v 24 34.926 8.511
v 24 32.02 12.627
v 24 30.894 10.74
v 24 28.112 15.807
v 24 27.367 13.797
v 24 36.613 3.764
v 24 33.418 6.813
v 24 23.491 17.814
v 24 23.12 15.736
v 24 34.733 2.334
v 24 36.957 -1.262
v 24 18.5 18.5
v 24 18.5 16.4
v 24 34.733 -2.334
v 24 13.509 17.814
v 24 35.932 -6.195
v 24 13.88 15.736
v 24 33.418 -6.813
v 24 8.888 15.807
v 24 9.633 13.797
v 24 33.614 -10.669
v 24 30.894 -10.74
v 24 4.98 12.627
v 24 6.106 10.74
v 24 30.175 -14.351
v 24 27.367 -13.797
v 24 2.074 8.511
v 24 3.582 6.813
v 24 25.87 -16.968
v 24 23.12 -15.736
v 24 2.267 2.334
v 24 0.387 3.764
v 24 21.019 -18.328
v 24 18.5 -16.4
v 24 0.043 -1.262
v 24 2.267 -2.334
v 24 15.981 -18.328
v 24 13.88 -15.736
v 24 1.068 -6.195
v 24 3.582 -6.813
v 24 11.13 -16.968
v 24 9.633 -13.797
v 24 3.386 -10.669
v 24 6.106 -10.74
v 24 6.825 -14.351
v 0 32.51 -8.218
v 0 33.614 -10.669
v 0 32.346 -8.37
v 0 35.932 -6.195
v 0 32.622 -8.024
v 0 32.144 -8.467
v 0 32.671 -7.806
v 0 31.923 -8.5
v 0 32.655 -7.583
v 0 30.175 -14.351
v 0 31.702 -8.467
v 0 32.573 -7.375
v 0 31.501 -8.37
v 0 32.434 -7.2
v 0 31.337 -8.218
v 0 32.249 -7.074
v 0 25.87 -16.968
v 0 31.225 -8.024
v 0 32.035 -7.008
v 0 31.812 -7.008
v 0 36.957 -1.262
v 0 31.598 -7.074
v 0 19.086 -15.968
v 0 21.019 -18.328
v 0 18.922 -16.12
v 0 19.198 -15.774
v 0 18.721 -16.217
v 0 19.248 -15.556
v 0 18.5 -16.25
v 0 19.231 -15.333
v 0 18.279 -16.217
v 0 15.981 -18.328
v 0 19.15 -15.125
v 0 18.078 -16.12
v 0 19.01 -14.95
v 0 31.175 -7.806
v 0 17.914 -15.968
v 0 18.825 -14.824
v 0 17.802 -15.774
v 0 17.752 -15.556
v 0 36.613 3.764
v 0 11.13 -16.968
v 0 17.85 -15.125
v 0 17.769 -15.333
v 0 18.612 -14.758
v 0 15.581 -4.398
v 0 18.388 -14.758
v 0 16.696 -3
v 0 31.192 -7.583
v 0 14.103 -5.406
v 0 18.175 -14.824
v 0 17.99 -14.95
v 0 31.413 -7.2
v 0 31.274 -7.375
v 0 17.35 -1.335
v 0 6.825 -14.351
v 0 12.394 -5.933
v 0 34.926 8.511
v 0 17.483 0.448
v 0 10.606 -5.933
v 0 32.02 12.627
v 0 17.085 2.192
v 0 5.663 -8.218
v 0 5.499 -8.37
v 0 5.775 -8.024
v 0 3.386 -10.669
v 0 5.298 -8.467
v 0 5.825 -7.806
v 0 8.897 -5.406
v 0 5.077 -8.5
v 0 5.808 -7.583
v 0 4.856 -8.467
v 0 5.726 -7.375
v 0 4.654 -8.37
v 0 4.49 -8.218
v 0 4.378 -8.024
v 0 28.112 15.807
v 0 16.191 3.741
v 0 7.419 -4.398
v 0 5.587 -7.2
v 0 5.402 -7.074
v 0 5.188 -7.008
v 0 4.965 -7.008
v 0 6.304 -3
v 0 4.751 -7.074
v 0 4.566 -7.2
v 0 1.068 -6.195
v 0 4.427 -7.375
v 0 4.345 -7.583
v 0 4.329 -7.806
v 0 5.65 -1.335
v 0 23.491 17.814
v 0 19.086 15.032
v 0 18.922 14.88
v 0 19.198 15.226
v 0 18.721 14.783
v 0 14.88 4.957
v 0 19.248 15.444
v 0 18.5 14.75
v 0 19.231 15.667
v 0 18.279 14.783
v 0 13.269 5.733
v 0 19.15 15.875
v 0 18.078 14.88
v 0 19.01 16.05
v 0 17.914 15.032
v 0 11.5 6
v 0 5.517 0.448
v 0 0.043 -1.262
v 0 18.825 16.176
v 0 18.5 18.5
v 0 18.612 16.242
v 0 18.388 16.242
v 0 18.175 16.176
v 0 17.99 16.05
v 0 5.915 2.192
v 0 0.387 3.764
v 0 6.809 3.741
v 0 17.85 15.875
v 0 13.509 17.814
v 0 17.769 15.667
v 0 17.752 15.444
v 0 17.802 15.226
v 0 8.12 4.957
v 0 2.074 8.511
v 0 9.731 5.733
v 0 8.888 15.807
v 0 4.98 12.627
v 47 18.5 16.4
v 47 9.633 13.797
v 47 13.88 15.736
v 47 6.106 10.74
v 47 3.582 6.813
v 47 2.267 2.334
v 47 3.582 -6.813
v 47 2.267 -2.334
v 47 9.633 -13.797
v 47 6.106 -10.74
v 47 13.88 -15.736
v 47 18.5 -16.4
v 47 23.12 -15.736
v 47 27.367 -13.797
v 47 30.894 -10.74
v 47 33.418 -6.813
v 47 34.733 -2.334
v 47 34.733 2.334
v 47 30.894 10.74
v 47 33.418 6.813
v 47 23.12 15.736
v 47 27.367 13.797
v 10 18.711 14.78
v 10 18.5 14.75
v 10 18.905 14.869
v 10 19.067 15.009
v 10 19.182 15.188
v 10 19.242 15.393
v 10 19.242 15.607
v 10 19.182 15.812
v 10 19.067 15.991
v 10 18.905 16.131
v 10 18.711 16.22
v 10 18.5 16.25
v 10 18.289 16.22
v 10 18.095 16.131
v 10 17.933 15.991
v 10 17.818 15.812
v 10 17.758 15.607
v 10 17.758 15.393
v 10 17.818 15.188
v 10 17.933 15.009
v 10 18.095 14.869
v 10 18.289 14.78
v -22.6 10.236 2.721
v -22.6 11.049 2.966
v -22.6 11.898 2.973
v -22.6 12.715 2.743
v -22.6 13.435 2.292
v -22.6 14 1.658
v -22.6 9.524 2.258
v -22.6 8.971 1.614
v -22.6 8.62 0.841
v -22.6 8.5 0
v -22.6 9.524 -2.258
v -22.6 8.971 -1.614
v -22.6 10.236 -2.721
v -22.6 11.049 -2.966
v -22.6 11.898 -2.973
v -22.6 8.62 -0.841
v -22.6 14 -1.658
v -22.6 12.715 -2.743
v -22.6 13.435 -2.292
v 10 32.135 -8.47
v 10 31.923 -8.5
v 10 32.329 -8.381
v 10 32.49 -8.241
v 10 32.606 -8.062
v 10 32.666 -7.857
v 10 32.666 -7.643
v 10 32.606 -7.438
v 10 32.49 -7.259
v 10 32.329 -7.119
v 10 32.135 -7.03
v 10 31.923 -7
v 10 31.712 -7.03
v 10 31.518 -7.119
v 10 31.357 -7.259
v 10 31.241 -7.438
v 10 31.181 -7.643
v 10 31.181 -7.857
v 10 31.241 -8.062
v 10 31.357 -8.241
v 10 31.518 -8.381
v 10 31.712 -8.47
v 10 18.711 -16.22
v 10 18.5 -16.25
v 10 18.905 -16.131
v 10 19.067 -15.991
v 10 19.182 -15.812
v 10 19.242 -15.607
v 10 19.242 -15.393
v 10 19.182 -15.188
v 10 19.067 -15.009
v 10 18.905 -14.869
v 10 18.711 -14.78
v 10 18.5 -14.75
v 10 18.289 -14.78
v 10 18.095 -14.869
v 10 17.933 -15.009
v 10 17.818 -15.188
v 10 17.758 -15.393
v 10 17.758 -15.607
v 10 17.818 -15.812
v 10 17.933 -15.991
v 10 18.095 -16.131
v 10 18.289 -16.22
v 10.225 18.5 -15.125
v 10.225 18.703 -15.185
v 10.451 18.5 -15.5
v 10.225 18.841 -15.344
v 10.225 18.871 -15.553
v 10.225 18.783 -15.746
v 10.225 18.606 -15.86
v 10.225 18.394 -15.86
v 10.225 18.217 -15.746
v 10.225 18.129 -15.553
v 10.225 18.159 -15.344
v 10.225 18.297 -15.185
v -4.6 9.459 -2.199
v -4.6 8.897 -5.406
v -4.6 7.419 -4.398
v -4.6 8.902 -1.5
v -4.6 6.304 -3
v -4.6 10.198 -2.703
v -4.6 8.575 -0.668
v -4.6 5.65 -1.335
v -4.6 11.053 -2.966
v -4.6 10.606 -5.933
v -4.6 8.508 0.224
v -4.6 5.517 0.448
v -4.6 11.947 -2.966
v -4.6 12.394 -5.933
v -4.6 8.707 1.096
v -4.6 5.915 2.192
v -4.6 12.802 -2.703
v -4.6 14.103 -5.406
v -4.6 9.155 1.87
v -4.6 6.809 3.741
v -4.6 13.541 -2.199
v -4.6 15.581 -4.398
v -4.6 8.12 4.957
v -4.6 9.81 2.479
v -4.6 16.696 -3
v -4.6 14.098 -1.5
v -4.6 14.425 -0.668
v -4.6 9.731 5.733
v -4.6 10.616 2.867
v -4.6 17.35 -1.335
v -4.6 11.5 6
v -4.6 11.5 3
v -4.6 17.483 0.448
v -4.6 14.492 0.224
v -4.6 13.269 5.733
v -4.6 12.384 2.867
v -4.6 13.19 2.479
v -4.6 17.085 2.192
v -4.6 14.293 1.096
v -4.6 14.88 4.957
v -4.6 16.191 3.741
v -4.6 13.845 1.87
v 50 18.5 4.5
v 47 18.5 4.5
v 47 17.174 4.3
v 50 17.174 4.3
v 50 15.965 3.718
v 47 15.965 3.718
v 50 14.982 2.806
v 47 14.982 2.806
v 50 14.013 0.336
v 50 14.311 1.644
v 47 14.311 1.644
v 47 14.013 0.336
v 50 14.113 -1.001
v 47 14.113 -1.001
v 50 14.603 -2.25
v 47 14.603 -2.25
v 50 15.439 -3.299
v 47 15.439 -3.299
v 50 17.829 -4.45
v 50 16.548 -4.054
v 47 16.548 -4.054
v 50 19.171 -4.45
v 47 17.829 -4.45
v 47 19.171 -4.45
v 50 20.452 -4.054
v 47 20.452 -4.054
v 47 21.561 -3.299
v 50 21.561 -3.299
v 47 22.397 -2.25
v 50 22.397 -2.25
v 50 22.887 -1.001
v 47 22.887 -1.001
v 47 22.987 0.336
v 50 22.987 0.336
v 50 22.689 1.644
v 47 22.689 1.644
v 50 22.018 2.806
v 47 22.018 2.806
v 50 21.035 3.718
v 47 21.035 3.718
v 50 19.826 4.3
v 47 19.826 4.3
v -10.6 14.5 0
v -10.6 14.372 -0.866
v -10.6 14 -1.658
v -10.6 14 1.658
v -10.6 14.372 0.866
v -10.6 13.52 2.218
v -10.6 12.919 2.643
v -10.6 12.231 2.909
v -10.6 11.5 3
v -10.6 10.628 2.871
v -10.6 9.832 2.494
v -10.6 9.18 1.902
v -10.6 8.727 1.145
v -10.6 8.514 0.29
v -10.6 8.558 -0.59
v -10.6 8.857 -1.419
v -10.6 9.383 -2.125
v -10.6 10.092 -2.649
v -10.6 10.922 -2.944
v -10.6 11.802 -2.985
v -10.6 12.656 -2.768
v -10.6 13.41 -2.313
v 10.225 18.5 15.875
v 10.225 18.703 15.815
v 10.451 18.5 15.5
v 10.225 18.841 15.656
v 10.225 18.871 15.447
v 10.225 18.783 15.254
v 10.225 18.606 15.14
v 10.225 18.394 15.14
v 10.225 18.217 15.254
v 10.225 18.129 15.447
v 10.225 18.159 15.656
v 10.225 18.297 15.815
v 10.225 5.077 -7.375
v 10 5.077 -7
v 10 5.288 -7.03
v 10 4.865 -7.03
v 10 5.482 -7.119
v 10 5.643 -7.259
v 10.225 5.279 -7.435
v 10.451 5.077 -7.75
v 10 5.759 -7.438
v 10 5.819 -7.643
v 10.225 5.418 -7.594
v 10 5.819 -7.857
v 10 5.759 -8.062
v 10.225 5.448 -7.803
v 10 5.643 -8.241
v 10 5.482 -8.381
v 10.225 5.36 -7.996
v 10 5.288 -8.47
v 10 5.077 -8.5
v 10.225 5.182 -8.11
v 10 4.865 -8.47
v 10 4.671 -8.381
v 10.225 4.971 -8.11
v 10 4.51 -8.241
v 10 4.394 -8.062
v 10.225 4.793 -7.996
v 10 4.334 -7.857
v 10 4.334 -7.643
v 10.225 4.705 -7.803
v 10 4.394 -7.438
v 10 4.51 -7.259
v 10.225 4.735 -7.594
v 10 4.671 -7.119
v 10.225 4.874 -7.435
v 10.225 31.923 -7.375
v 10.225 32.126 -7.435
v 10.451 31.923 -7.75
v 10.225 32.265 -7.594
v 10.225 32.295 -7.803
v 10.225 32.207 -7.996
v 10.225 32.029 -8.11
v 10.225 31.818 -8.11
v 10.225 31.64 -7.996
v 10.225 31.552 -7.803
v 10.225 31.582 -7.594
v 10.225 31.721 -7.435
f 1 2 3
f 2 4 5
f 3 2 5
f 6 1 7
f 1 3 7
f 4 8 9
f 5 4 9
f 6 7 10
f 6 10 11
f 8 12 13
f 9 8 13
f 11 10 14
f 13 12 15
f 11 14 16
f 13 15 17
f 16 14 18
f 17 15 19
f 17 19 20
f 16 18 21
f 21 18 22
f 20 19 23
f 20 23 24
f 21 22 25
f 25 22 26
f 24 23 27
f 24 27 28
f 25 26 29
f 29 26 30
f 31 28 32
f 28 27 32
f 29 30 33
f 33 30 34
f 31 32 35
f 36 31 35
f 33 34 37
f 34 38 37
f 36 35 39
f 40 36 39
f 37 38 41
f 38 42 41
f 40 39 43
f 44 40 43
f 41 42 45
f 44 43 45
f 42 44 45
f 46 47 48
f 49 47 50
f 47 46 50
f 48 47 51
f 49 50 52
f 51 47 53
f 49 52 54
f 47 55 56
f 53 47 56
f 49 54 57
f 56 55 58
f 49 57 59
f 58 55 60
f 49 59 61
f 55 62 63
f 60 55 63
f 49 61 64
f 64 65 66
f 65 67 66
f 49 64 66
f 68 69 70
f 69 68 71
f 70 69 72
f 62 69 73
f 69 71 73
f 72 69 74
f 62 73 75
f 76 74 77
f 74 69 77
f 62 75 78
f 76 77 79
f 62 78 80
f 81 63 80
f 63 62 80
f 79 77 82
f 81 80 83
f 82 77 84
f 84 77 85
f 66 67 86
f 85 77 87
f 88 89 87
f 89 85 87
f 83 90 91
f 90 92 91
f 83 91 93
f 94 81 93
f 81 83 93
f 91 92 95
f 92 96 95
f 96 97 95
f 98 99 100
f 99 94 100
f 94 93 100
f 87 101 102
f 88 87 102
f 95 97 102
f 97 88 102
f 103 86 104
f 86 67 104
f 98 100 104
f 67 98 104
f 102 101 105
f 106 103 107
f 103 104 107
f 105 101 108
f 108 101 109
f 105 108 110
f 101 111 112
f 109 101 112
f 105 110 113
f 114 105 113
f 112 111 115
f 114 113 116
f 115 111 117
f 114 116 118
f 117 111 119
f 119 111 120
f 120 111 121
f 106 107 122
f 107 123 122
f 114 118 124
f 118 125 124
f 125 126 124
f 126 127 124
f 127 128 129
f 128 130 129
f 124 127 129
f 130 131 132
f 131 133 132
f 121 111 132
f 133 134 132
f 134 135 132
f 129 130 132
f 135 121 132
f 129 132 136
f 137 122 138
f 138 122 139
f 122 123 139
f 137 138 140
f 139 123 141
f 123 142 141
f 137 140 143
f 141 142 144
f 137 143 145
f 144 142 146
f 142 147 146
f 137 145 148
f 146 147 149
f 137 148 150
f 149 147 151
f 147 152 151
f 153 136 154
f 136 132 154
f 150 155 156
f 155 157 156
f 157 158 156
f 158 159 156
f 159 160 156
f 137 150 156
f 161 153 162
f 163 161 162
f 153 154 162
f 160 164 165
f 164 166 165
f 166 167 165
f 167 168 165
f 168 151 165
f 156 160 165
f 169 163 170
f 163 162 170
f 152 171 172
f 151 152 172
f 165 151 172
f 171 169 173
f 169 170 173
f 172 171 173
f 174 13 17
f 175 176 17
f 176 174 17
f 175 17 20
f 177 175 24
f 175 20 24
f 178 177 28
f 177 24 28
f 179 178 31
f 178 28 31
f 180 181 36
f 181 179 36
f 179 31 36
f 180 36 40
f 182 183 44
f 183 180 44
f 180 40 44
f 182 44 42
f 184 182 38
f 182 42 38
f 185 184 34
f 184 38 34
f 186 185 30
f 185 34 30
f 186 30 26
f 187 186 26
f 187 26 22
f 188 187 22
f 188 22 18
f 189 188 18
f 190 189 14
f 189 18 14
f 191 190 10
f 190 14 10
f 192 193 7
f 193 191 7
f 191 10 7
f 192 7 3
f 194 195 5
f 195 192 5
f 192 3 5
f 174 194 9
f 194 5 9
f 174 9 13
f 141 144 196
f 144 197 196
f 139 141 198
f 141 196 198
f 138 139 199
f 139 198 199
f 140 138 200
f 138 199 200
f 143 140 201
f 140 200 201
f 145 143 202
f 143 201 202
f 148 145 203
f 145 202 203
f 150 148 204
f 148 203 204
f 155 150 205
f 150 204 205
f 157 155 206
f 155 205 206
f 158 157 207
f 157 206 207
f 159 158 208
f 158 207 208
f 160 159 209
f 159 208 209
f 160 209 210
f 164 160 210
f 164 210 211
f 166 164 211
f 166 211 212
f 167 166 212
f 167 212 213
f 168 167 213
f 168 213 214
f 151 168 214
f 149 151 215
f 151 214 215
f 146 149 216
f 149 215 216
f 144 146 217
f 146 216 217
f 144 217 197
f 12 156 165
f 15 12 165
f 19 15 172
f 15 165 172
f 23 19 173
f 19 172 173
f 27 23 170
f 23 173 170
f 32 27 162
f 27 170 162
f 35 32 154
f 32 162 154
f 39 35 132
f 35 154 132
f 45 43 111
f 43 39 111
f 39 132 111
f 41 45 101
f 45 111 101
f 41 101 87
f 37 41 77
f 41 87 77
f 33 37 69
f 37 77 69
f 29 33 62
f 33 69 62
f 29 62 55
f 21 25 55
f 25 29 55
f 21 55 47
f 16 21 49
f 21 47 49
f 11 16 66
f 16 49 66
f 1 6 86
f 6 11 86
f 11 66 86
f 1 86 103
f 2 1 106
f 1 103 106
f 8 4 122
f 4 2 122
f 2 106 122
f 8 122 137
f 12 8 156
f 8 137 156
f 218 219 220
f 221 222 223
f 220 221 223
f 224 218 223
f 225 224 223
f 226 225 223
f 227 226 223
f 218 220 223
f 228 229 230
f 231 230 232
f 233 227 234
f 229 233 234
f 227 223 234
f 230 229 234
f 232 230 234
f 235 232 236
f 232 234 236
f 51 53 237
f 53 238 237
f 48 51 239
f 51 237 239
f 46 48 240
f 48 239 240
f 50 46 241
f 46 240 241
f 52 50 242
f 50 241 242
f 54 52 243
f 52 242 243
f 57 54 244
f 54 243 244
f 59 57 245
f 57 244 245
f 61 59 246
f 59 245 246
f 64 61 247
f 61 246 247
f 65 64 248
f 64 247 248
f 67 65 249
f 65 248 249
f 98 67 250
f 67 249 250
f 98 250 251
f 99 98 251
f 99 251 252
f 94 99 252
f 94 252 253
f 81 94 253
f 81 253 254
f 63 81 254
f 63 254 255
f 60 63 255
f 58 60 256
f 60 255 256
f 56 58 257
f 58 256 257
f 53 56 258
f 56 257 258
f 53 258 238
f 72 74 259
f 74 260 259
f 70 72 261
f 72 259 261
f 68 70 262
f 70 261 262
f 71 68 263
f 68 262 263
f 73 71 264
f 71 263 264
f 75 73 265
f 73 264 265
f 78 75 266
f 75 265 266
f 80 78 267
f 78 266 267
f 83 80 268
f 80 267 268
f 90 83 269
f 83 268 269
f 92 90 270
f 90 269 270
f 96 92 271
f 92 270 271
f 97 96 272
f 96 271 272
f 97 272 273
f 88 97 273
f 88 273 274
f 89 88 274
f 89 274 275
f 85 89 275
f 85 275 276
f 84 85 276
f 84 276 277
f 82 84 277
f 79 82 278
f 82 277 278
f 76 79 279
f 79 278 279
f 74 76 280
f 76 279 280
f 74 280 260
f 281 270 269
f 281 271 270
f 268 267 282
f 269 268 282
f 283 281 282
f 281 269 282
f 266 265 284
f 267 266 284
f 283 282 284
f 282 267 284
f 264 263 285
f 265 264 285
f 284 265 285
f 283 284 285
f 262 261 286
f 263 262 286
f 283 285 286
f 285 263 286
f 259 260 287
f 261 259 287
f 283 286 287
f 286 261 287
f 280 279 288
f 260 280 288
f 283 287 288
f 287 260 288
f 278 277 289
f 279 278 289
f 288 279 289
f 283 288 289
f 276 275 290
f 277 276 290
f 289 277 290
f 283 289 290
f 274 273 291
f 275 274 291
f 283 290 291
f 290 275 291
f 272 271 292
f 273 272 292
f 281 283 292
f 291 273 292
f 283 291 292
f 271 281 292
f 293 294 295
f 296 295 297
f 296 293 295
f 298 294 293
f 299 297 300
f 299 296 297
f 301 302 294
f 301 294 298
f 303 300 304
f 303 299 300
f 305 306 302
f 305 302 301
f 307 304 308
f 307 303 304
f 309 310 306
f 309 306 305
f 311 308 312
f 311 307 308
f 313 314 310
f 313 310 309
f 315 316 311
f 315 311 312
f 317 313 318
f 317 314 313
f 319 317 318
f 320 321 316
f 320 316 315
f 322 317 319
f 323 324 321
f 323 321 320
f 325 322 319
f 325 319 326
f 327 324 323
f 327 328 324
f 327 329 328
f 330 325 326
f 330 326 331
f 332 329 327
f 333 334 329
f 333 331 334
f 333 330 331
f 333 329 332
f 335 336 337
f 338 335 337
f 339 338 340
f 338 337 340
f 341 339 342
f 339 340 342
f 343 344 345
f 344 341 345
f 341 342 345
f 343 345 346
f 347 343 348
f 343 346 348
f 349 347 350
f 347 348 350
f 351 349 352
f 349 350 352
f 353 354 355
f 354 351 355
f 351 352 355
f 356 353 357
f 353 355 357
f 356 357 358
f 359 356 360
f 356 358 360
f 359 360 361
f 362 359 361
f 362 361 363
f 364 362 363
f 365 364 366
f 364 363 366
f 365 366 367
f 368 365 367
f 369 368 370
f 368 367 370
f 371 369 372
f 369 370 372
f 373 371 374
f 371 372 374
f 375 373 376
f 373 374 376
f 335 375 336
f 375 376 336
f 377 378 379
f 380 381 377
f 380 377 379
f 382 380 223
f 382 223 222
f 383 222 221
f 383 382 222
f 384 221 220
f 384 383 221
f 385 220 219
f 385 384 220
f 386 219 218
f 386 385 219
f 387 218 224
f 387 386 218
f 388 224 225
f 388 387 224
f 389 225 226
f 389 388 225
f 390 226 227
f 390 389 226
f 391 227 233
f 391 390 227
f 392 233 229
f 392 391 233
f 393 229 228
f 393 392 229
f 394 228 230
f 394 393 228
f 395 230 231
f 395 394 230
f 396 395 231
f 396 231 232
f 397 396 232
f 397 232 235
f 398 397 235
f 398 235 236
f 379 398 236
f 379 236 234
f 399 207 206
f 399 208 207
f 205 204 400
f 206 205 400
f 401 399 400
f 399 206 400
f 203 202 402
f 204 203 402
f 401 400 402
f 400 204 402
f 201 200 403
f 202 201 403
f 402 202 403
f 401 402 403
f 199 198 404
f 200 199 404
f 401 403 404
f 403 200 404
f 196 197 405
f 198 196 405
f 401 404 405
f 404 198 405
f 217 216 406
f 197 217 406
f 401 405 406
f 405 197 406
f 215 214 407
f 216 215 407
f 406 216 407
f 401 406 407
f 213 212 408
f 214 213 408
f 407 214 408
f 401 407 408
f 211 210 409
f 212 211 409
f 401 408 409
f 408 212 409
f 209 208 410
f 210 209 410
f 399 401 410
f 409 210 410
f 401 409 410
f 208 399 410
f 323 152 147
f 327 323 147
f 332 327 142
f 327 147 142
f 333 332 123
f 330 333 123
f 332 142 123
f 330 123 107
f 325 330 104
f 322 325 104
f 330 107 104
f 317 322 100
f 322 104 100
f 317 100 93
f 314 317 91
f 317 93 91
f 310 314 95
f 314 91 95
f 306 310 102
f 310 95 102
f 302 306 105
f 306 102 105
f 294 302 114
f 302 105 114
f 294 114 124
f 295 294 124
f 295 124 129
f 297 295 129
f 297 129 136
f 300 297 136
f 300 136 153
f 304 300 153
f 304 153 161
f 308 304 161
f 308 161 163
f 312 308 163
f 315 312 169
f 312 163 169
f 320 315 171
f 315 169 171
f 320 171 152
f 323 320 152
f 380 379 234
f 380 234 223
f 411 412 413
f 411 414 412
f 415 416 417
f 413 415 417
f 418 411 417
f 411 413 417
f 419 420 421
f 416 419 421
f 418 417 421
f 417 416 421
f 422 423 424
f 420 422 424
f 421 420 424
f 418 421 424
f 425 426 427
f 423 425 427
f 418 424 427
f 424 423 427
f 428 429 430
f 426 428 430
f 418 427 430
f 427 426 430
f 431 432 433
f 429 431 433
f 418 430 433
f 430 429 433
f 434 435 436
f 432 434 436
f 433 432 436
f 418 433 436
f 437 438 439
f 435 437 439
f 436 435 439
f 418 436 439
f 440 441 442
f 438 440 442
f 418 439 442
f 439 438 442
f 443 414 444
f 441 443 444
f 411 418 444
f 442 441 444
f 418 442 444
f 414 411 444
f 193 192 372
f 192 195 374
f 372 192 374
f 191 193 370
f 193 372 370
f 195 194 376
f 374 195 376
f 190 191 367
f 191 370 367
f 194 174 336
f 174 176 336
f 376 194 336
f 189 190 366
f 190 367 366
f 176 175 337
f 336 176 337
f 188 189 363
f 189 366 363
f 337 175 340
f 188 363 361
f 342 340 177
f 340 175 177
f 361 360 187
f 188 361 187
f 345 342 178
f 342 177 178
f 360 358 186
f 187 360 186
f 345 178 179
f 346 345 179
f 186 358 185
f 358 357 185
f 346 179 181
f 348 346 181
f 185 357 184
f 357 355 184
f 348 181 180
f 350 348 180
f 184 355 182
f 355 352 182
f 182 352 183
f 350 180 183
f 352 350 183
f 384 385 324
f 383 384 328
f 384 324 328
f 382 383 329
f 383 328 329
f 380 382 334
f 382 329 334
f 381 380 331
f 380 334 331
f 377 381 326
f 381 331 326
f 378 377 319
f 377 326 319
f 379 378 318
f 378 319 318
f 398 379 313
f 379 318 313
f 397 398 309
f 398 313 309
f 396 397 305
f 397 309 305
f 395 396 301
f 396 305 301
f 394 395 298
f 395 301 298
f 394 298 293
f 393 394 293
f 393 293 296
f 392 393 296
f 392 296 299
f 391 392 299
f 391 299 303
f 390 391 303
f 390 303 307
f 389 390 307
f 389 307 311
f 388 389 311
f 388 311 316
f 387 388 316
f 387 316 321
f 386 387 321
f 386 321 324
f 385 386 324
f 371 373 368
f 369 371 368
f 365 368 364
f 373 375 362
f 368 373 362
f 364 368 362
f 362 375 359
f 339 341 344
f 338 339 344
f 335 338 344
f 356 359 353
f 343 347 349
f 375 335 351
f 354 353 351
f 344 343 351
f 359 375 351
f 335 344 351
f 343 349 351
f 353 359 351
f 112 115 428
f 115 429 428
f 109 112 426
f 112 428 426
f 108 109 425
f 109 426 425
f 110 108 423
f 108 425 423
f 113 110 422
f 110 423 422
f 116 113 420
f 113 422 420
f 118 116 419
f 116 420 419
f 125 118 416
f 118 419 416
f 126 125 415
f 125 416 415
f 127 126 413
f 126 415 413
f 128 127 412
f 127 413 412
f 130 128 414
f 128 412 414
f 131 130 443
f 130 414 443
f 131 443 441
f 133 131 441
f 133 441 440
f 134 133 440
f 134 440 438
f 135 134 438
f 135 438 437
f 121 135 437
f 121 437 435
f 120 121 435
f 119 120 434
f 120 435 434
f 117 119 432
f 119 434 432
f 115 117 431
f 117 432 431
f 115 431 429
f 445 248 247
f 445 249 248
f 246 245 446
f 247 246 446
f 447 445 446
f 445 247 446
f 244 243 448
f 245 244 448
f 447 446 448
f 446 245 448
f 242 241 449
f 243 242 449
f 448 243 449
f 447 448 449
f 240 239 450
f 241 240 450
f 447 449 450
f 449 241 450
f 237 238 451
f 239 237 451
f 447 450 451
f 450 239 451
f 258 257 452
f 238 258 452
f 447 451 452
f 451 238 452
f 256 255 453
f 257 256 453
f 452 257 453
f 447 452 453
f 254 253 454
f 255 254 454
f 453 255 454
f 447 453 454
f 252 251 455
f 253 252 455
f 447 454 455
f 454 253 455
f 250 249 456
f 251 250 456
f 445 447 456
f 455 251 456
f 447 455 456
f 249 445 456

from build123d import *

# Parameters (mm, degrees)
F_1_5MM_DOWEL_HOLE1_D     = 1.5
F_1_5MM_DOWEL_HOLE1_DEPTH = 10
F_1_5MM_DOWEL_HOLE1_TIP   = 0.450645464
SKETCH3_R                 = 6
BOSS_EXTRUDE1_DEPTH       = 4.6
SKETCH7_R                 = 3
BOSS_EXTRUDE2_DEPTH       = 6
BOSS_EXTRUDE3_DEPTH       = 12


with BuildPart() as part:
    # Sketch2 one side → Revolve1 (revolve)
    with BuildSketch(Plane.XY):
        Polygon((24, 37), (0, 37), (0, 18.5), (50, 18.5), (50, 23), (47, 23), (47, 34.9), (24, 34.9), align=None)
    revolve(axis=Axis((0, 18.5, 0), (1, 0, 0)))

    # Sketch2<3> one side → Revolve2 (revolve)
    with BuildSketch(Plane.XY):
        Polygon((24, 37), (0, 37), (0, 18.5), (50, 18.5), (50, 23), (47, 23), (47, 34.9), (24, 34.9), align=None)
    revolve(axis=Axis((0, 18.5, 0), (1, 0, 0)))

    # Ø1.5mm Dowel Hole1
    with Locations(Plane.ZY):
        with Locations((-7.75, 31.923393759), (-15.5, 18.5), (-7.75, 5.076606241), (15.5, 18.5)):
            Hole(F_1_5MM_DOWEL_HOLE1_D / 2, depth=F_1_5MM_DOWEL_HOLE1_DEPTH)
            with Locations((0, 0, -(F_1_5MM_DOWEL_HOLE1_DEPTH + F_1_5MM_DOWEL_HOLE1_TIP / 2))):  # 118° drill point
                Cone(0, F_1_5MM_DOWEL_HOLE1_D / 2, F_1_5MM_DOWEL_HOLE1_TIP, mode=Mode.SUBTRACT)

    # Sketch3 → Boss-Extrude1 (add)
    with BuildSketch(Plane.ZY):
        with Locations((0, 11.5)):
            Circle(SKETCH3_R)
    extrude(amount=BOSS_EXTRUDE1_DEPTH)

    # Sketch7 → Boss-Extrude2 (add)
    with BuildSketch(Plane.ZY.offset(4.6)):
        with Locations((0, 11.5)):
            Circle(SKETCH7_R)
    extrude(amount=BOSS_EXTRUDE2_DEPTH)

    # Sketch8 → Boss-Extrude3 (add)
    with BuildSketch(Plane.ZY.offset(10.6)):
        with BuildLine():
            Line((-1.658312395, 14), (1.658312395, 14))
            ThreePointArc((1.658312395, 14), (0, 8.5), (-1.658312395, 14))
        make_face()
    extrude(amount=BOSS_EXTRUDE3_DEPTH)


solid = part.part
